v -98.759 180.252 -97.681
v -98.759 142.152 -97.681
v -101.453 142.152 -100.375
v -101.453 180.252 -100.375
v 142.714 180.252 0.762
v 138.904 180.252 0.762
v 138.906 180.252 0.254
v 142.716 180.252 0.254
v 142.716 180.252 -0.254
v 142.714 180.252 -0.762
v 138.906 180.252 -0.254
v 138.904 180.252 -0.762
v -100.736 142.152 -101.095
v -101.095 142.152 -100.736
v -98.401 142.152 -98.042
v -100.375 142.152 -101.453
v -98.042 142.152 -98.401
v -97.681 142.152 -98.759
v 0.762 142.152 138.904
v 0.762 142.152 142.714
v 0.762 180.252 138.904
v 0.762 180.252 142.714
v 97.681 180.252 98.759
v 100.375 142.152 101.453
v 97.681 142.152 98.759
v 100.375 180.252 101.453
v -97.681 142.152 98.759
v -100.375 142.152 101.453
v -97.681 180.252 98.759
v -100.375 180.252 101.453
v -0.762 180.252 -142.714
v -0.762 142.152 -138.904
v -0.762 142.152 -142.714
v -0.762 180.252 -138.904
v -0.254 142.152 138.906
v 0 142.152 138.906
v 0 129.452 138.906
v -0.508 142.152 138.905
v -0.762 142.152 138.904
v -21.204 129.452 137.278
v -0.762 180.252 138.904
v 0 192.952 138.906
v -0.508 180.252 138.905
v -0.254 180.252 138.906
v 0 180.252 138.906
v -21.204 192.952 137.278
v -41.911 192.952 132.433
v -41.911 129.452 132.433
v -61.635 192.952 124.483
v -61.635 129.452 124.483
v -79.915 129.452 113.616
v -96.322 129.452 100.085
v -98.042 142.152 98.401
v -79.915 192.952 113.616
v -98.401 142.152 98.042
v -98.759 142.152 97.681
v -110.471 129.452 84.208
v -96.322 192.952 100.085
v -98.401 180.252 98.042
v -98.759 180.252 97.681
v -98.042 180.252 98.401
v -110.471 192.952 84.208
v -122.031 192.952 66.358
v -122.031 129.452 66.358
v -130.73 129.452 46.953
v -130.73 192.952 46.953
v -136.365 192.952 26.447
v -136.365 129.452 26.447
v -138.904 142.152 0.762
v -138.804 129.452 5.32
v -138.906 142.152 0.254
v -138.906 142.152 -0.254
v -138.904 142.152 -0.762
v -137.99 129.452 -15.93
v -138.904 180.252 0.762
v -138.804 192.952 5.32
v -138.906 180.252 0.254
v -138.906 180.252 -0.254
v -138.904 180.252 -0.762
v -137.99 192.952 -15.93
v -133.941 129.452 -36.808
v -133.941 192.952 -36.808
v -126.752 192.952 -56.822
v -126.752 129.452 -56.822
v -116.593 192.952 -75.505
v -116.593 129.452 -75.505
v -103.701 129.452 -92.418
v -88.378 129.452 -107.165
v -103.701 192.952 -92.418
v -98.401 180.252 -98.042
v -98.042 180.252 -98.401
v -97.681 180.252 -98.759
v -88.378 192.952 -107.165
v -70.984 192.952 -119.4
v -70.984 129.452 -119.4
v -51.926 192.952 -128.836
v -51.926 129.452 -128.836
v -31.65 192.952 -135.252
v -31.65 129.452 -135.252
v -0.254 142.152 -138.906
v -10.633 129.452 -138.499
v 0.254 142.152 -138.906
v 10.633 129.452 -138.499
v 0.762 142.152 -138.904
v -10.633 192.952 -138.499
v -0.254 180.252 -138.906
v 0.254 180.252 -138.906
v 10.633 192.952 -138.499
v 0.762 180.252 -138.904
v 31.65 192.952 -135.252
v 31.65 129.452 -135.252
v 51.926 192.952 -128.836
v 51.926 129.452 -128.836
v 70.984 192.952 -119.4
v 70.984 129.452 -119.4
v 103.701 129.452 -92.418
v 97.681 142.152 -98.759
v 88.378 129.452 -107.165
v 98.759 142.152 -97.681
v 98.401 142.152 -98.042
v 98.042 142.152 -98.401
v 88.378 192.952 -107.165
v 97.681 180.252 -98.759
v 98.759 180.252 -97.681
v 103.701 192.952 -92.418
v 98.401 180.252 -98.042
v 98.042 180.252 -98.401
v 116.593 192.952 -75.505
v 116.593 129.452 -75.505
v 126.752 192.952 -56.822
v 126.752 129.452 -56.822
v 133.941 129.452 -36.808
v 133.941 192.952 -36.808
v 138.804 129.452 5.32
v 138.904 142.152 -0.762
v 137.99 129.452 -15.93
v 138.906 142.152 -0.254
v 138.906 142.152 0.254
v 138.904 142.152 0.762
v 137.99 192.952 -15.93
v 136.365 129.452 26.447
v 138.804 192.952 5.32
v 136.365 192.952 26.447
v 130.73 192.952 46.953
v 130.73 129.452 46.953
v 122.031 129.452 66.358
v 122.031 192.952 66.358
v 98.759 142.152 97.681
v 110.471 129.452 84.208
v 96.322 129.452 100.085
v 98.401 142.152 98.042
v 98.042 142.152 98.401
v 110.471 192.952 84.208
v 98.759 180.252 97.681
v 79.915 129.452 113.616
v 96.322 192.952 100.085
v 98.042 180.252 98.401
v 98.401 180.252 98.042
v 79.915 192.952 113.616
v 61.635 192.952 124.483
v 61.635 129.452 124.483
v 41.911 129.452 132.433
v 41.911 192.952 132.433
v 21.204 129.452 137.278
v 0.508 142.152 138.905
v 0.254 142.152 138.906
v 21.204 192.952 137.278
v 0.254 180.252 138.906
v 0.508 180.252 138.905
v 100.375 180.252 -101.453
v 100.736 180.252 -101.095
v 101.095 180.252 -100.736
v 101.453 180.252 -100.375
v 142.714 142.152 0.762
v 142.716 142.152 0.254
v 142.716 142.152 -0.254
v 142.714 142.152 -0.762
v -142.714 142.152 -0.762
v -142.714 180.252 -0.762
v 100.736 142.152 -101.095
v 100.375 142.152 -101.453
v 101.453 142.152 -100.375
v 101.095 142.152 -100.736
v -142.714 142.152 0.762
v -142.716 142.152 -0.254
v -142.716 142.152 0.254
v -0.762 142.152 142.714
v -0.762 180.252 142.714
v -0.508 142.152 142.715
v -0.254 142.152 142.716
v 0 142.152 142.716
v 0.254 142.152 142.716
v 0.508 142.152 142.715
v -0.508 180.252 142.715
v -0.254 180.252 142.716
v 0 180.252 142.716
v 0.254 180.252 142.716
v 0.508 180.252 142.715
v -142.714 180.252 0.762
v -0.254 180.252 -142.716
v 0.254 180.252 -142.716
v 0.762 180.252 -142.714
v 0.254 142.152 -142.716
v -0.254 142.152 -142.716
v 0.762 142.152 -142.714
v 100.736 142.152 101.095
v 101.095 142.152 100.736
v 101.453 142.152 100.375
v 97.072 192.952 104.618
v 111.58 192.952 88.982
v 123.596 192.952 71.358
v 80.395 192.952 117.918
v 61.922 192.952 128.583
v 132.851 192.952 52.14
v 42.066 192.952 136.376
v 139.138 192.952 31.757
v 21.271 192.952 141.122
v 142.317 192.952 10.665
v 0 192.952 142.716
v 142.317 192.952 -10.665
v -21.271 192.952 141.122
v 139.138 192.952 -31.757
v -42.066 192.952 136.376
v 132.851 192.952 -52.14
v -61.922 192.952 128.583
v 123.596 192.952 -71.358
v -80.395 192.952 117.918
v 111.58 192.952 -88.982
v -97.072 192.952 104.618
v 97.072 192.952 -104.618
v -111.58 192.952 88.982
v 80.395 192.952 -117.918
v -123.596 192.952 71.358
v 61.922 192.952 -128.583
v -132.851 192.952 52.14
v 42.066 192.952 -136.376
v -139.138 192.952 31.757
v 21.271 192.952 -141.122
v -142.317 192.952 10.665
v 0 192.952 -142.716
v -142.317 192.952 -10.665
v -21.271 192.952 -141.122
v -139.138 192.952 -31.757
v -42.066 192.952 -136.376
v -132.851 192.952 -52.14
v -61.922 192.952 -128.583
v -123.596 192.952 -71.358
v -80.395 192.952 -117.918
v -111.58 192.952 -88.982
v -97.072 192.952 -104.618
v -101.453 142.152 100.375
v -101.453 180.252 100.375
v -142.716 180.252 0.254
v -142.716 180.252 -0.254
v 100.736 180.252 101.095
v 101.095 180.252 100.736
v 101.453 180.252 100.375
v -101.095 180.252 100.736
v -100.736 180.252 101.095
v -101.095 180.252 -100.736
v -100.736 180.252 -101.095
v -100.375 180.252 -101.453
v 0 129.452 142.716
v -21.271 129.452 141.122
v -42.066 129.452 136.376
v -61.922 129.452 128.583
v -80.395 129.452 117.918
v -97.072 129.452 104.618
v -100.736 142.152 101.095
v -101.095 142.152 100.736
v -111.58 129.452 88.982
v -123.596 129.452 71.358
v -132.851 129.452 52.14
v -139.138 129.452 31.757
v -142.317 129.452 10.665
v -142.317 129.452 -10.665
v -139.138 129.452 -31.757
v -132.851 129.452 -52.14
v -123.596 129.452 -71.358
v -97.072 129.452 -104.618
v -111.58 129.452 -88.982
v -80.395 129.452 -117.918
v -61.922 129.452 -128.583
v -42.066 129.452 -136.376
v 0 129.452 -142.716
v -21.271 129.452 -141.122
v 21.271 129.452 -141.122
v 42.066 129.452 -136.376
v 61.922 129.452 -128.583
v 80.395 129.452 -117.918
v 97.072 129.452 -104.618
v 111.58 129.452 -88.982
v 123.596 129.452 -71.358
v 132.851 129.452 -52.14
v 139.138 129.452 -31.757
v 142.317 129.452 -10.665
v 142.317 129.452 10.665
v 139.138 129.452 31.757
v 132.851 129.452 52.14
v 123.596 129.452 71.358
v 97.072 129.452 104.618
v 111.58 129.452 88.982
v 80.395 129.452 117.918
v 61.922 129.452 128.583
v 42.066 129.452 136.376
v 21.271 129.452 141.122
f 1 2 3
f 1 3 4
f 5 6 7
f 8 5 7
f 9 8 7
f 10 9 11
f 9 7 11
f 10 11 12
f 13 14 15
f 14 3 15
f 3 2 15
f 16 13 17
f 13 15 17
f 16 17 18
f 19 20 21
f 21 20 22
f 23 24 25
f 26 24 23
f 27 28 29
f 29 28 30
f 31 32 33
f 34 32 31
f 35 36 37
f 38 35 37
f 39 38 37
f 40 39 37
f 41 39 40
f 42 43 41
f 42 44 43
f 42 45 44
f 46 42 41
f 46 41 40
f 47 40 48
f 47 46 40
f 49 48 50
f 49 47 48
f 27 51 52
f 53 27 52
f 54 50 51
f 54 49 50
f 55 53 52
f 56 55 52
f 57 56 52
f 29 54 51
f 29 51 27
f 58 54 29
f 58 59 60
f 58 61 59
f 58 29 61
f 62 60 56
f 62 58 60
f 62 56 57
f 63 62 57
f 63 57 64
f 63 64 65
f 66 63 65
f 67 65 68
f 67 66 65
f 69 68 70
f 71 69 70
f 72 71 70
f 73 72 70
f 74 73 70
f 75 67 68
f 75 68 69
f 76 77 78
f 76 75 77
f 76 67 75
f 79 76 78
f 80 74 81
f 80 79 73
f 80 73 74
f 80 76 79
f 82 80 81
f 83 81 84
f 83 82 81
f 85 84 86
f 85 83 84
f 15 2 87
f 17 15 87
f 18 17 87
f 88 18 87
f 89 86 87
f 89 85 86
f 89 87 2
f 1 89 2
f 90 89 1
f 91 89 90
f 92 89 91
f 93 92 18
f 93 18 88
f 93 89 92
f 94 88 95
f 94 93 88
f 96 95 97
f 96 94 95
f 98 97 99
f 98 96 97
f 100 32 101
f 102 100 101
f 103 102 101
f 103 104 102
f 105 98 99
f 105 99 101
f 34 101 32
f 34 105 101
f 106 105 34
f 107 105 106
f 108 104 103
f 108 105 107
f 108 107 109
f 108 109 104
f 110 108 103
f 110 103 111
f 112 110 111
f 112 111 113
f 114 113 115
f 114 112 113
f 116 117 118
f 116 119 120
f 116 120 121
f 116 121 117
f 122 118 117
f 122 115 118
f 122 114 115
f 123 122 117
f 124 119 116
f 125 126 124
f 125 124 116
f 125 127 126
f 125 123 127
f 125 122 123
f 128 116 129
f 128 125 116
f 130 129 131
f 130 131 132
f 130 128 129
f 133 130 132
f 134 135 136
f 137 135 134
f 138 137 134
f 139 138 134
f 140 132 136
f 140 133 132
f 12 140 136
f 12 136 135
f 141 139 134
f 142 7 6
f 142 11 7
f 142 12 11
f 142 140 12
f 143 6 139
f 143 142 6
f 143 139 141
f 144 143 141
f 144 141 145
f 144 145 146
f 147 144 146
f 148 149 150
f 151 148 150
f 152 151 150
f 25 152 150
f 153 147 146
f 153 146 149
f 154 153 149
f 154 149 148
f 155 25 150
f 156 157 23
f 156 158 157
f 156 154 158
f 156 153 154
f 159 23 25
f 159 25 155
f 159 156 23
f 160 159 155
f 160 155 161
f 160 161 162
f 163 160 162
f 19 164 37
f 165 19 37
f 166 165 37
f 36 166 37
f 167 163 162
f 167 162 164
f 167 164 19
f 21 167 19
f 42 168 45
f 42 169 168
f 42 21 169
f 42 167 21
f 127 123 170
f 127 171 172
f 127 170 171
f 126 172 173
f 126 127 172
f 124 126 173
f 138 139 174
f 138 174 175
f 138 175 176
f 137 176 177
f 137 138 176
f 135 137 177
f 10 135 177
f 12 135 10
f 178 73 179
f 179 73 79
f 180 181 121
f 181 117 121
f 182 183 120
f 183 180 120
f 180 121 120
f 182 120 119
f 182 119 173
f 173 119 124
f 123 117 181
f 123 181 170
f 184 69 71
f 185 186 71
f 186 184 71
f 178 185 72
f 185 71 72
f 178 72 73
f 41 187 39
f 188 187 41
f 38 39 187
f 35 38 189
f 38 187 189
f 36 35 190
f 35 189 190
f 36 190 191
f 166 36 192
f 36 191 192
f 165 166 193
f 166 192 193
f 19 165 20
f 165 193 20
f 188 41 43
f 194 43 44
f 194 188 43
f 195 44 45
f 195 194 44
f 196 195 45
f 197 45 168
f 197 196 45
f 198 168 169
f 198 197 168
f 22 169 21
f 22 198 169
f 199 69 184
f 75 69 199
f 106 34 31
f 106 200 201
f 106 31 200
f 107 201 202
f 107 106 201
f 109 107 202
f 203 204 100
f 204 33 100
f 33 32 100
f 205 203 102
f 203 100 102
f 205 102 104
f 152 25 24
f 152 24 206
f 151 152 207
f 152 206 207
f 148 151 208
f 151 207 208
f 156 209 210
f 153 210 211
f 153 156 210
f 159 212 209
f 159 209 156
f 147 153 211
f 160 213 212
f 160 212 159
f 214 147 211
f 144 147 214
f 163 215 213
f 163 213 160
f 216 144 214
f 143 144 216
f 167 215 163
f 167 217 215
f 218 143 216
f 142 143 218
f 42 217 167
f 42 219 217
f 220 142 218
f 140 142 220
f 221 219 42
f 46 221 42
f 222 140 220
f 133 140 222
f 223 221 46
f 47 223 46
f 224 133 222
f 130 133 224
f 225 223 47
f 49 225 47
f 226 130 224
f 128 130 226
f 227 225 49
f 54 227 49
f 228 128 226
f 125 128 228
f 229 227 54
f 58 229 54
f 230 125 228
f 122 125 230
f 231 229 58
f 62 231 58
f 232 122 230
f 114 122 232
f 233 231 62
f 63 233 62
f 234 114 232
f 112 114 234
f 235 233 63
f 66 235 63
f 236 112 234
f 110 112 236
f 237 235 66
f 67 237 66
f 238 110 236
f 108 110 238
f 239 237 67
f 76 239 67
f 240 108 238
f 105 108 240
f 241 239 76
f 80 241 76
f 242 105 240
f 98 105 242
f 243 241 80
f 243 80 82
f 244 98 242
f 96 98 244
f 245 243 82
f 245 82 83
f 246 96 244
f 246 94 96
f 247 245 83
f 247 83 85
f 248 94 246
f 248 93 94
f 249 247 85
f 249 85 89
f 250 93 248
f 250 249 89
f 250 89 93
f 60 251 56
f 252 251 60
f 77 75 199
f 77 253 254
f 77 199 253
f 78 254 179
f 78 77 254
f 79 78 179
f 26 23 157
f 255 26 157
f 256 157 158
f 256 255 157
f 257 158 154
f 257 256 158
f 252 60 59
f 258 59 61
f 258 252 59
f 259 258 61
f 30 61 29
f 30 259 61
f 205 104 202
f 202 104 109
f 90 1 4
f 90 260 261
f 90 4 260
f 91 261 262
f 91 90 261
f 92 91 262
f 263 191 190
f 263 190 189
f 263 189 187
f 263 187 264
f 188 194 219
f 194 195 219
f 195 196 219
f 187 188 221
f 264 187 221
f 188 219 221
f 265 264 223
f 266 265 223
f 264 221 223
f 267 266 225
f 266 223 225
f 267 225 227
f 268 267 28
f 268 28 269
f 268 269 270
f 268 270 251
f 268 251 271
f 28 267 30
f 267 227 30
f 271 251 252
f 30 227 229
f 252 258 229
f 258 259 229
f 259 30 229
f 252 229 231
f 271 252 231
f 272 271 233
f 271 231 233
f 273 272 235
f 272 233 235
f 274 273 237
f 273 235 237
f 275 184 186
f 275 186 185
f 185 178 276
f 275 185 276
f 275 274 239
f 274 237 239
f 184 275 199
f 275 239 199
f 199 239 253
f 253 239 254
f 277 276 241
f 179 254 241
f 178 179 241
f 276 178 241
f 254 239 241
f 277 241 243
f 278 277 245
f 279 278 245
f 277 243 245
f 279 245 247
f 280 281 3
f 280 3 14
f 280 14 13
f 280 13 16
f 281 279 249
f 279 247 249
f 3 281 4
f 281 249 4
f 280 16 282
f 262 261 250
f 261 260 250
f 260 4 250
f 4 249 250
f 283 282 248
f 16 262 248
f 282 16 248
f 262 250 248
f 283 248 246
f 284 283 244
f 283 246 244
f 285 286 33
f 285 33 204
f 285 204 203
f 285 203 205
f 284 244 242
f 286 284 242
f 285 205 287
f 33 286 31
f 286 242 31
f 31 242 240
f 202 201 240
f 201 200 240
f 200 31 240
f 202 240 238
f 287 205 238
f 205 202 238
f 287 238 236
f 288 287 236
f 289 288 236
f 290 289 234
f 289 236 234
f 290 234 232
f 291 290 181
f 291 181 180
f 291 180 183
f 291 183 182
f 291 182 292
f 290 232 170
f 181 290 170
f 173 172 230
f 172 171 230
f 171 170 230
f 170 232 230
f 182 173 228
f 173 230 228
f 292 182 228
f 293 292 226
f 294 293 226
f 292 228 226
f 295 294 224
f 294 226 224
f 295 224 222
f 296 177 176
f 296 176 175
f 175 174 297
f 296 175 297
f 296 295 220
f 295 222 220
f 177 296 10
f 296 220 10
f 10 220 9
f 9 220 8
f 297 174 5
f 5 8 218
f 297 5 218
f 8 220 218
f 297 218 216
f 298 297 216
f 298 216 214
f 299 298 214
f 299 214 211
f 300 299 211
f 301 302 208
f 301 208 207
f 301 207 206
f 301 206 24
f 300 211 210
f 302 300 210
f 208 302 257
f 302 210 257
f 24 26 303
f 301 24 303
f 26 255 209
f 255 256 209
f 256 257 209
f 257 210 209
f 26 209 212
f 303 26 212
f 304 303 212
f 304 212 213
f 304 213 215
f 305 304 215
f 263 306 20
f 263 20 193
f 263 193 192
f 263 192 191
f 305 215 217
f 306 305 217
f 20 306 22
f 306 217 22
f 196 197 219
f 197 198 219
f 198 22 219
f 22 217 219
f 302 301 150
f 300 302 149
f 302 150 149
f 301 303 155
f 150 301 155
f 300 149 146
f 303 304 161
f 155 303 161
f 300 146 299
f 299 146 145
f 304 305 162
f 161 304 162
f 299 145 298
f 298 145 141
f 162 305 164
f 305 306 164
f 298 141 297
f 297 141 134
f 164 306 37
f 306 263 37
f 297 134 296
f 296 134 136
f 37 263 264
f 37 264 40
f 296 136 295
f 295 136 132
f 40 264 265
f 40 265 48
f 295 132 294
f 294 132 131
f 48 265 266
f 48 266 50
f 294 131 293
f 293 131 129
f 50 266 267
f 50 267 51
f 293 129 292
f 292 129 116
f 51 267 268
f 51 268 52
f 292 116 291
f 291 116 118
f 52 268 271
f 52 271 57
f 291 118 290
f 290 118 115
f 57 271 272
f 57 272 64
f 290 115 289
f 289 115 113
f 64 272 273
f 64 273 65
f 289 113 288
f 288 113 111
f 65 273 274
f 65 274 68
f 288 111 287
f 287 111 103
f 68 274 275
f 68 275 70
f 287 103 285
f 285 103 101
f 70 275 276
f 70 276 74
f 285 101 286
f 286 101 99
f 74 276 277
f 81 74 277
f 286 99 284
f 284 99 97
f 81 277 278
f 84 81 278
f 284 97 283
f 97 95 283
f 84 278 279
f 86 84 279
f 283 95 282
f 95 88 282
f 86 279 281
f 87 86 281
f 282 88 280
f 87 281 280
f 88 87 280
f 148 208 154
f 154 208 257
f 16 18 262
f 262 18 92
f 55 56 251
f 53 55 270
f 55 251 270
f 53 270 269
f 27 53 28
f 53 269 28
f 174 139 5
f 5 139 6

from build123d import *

# Parameters (mm, degrees)
SKETCH1_W                           = 3.81
SKETCH1_H                           = 63.5
CUT_EXTRUDE1_REACH                  = 281.224
CUT_EXTRUDE1_END_RADIUS             = 142.71625
SKETCH2_W                           = 1.524
SKETCH2_H                           = 38.1
CUT_EXTRUDE1_DIRECTION_2_REACH      = 281.224
CUT_EXTRUDE1_DIRECTION_2_END_RADIUS = 142.71625
CIRPATTERN1_COUNT                   = 4
CIRPATTERN1_ANGLE                   = 135


with BuildPart() as part:
    # Sketch1 → Revolve1 (revolve)
    with BuildSketch(Plane.XY, mode=Mode.PRIVATE) as revolve1_sk:
        with Locations((140.81125, 161.201652174)):
            Rectangle(SKETCH1_W, SKETCH1_H)
    revolve(revolve1_sk.sketch.rotate(Axis((0, 0, 0), (0, -1, 0)), 90), axis=Axis((0, 0, 0), (0, -1, 0)))

    # Cut-Extrude1: up to this cylinder (the profile starts inside it)
    cut_extrude1_end = Plane(origin=(0, 161.201652, 0), z_dir=(0, 1, 0)) * Cylinder(CUT_EXTRUDE1_END_RADIUS, 848.8805, mode=Mode.PRIVATE)
    # Sketch2 → Cut-Extrude1 (cut, up to the surface)
    with BuildSketch(Plane(origin=(0, 0, 0), x_dir=(0, 0, -1), z_dir=(1, 0, 0)), mode=Mode.PRIVATE) as cut_extrude1_sk1:
        with Locations((0, 161.201652174)):
            Rectangle(SKETCH2_W, SKETCH2_H)
    cut_extrude1_tool1 = extrude(cut_extrude1_sk1.sketch, amount=-CUT_EXTRUDE1_REACH, mode=Mode.PRIVATE) & cut_extrude1_end
    cut_extrude1 = cut_extrude1_tool1.solids().sort_by_distance((0, 161.201652, 0))[0]
    add(cut_extrude1, mode=Mode.SUBTRACT)

    # Cut-Extrude1 direction 2: up to this cylinder (the profile starts inside it)
    cut_extrude1_direction_2_end = Plane(origin=(0, 161.201652, 0), z_dir=(0, 1, 0)) * Cylinder(CUT_EXTRUDE1_DIRECTION_2_END_RADIUS, 848.8805, mode=Mode.PRIVATE)
    # Sketch2 → Cut-Extrude1 direction 2 (cut, up to the surface)
    with BuildSketch(Plane(origin=(0, 0, 0), x_dir=(0, 0, -1), z_dir=(1, 0, 0)), mode=Mode.PRIVATE) as cut_extrude1_direction_2_sk1:
        with Locations((0, 161.201652174)):
            Rectangle(SKETCH2_W, SKETCH2_H)
    cut_extrude1_direction_2_tool1 = extrude(cut_extrude1_direction_2_sk1.sketch, amount=CUT_EXTRUDE1_DIRECTION_2_REACH, mode=Mode.PRIVATE) & cut_extrude1_direction_2_end
    cut_extrude1_direction_2 = cut_extrude1_direction_2_tool1.solids().sort_by_distance((0, 161.201652, 0))[0]
    add(cut_extrude1_direction_2, mode=Mode.SUBTRACT)
    cut_extrude1 = cut_extrude1 + cut_extrude1_direction_2  # both directions under the feature's name, for the pattern or mirror that repeats it

    # CirPattern1: Cut-Extrude1 ×4 about axis
    cirpattern1_axis = Axis((0, 0, 0), (0, -1, 0))
    for i in range(1, CIRPATTERN1_COUNT):
        add(cut_extrude1.rotate(cirpattern1_axis, i * CIRPATTERN1_ANGLE / (CIRPATTERN1_COUNT - 1)), mode=Mode.SUBTRACT)


solid = part.part
